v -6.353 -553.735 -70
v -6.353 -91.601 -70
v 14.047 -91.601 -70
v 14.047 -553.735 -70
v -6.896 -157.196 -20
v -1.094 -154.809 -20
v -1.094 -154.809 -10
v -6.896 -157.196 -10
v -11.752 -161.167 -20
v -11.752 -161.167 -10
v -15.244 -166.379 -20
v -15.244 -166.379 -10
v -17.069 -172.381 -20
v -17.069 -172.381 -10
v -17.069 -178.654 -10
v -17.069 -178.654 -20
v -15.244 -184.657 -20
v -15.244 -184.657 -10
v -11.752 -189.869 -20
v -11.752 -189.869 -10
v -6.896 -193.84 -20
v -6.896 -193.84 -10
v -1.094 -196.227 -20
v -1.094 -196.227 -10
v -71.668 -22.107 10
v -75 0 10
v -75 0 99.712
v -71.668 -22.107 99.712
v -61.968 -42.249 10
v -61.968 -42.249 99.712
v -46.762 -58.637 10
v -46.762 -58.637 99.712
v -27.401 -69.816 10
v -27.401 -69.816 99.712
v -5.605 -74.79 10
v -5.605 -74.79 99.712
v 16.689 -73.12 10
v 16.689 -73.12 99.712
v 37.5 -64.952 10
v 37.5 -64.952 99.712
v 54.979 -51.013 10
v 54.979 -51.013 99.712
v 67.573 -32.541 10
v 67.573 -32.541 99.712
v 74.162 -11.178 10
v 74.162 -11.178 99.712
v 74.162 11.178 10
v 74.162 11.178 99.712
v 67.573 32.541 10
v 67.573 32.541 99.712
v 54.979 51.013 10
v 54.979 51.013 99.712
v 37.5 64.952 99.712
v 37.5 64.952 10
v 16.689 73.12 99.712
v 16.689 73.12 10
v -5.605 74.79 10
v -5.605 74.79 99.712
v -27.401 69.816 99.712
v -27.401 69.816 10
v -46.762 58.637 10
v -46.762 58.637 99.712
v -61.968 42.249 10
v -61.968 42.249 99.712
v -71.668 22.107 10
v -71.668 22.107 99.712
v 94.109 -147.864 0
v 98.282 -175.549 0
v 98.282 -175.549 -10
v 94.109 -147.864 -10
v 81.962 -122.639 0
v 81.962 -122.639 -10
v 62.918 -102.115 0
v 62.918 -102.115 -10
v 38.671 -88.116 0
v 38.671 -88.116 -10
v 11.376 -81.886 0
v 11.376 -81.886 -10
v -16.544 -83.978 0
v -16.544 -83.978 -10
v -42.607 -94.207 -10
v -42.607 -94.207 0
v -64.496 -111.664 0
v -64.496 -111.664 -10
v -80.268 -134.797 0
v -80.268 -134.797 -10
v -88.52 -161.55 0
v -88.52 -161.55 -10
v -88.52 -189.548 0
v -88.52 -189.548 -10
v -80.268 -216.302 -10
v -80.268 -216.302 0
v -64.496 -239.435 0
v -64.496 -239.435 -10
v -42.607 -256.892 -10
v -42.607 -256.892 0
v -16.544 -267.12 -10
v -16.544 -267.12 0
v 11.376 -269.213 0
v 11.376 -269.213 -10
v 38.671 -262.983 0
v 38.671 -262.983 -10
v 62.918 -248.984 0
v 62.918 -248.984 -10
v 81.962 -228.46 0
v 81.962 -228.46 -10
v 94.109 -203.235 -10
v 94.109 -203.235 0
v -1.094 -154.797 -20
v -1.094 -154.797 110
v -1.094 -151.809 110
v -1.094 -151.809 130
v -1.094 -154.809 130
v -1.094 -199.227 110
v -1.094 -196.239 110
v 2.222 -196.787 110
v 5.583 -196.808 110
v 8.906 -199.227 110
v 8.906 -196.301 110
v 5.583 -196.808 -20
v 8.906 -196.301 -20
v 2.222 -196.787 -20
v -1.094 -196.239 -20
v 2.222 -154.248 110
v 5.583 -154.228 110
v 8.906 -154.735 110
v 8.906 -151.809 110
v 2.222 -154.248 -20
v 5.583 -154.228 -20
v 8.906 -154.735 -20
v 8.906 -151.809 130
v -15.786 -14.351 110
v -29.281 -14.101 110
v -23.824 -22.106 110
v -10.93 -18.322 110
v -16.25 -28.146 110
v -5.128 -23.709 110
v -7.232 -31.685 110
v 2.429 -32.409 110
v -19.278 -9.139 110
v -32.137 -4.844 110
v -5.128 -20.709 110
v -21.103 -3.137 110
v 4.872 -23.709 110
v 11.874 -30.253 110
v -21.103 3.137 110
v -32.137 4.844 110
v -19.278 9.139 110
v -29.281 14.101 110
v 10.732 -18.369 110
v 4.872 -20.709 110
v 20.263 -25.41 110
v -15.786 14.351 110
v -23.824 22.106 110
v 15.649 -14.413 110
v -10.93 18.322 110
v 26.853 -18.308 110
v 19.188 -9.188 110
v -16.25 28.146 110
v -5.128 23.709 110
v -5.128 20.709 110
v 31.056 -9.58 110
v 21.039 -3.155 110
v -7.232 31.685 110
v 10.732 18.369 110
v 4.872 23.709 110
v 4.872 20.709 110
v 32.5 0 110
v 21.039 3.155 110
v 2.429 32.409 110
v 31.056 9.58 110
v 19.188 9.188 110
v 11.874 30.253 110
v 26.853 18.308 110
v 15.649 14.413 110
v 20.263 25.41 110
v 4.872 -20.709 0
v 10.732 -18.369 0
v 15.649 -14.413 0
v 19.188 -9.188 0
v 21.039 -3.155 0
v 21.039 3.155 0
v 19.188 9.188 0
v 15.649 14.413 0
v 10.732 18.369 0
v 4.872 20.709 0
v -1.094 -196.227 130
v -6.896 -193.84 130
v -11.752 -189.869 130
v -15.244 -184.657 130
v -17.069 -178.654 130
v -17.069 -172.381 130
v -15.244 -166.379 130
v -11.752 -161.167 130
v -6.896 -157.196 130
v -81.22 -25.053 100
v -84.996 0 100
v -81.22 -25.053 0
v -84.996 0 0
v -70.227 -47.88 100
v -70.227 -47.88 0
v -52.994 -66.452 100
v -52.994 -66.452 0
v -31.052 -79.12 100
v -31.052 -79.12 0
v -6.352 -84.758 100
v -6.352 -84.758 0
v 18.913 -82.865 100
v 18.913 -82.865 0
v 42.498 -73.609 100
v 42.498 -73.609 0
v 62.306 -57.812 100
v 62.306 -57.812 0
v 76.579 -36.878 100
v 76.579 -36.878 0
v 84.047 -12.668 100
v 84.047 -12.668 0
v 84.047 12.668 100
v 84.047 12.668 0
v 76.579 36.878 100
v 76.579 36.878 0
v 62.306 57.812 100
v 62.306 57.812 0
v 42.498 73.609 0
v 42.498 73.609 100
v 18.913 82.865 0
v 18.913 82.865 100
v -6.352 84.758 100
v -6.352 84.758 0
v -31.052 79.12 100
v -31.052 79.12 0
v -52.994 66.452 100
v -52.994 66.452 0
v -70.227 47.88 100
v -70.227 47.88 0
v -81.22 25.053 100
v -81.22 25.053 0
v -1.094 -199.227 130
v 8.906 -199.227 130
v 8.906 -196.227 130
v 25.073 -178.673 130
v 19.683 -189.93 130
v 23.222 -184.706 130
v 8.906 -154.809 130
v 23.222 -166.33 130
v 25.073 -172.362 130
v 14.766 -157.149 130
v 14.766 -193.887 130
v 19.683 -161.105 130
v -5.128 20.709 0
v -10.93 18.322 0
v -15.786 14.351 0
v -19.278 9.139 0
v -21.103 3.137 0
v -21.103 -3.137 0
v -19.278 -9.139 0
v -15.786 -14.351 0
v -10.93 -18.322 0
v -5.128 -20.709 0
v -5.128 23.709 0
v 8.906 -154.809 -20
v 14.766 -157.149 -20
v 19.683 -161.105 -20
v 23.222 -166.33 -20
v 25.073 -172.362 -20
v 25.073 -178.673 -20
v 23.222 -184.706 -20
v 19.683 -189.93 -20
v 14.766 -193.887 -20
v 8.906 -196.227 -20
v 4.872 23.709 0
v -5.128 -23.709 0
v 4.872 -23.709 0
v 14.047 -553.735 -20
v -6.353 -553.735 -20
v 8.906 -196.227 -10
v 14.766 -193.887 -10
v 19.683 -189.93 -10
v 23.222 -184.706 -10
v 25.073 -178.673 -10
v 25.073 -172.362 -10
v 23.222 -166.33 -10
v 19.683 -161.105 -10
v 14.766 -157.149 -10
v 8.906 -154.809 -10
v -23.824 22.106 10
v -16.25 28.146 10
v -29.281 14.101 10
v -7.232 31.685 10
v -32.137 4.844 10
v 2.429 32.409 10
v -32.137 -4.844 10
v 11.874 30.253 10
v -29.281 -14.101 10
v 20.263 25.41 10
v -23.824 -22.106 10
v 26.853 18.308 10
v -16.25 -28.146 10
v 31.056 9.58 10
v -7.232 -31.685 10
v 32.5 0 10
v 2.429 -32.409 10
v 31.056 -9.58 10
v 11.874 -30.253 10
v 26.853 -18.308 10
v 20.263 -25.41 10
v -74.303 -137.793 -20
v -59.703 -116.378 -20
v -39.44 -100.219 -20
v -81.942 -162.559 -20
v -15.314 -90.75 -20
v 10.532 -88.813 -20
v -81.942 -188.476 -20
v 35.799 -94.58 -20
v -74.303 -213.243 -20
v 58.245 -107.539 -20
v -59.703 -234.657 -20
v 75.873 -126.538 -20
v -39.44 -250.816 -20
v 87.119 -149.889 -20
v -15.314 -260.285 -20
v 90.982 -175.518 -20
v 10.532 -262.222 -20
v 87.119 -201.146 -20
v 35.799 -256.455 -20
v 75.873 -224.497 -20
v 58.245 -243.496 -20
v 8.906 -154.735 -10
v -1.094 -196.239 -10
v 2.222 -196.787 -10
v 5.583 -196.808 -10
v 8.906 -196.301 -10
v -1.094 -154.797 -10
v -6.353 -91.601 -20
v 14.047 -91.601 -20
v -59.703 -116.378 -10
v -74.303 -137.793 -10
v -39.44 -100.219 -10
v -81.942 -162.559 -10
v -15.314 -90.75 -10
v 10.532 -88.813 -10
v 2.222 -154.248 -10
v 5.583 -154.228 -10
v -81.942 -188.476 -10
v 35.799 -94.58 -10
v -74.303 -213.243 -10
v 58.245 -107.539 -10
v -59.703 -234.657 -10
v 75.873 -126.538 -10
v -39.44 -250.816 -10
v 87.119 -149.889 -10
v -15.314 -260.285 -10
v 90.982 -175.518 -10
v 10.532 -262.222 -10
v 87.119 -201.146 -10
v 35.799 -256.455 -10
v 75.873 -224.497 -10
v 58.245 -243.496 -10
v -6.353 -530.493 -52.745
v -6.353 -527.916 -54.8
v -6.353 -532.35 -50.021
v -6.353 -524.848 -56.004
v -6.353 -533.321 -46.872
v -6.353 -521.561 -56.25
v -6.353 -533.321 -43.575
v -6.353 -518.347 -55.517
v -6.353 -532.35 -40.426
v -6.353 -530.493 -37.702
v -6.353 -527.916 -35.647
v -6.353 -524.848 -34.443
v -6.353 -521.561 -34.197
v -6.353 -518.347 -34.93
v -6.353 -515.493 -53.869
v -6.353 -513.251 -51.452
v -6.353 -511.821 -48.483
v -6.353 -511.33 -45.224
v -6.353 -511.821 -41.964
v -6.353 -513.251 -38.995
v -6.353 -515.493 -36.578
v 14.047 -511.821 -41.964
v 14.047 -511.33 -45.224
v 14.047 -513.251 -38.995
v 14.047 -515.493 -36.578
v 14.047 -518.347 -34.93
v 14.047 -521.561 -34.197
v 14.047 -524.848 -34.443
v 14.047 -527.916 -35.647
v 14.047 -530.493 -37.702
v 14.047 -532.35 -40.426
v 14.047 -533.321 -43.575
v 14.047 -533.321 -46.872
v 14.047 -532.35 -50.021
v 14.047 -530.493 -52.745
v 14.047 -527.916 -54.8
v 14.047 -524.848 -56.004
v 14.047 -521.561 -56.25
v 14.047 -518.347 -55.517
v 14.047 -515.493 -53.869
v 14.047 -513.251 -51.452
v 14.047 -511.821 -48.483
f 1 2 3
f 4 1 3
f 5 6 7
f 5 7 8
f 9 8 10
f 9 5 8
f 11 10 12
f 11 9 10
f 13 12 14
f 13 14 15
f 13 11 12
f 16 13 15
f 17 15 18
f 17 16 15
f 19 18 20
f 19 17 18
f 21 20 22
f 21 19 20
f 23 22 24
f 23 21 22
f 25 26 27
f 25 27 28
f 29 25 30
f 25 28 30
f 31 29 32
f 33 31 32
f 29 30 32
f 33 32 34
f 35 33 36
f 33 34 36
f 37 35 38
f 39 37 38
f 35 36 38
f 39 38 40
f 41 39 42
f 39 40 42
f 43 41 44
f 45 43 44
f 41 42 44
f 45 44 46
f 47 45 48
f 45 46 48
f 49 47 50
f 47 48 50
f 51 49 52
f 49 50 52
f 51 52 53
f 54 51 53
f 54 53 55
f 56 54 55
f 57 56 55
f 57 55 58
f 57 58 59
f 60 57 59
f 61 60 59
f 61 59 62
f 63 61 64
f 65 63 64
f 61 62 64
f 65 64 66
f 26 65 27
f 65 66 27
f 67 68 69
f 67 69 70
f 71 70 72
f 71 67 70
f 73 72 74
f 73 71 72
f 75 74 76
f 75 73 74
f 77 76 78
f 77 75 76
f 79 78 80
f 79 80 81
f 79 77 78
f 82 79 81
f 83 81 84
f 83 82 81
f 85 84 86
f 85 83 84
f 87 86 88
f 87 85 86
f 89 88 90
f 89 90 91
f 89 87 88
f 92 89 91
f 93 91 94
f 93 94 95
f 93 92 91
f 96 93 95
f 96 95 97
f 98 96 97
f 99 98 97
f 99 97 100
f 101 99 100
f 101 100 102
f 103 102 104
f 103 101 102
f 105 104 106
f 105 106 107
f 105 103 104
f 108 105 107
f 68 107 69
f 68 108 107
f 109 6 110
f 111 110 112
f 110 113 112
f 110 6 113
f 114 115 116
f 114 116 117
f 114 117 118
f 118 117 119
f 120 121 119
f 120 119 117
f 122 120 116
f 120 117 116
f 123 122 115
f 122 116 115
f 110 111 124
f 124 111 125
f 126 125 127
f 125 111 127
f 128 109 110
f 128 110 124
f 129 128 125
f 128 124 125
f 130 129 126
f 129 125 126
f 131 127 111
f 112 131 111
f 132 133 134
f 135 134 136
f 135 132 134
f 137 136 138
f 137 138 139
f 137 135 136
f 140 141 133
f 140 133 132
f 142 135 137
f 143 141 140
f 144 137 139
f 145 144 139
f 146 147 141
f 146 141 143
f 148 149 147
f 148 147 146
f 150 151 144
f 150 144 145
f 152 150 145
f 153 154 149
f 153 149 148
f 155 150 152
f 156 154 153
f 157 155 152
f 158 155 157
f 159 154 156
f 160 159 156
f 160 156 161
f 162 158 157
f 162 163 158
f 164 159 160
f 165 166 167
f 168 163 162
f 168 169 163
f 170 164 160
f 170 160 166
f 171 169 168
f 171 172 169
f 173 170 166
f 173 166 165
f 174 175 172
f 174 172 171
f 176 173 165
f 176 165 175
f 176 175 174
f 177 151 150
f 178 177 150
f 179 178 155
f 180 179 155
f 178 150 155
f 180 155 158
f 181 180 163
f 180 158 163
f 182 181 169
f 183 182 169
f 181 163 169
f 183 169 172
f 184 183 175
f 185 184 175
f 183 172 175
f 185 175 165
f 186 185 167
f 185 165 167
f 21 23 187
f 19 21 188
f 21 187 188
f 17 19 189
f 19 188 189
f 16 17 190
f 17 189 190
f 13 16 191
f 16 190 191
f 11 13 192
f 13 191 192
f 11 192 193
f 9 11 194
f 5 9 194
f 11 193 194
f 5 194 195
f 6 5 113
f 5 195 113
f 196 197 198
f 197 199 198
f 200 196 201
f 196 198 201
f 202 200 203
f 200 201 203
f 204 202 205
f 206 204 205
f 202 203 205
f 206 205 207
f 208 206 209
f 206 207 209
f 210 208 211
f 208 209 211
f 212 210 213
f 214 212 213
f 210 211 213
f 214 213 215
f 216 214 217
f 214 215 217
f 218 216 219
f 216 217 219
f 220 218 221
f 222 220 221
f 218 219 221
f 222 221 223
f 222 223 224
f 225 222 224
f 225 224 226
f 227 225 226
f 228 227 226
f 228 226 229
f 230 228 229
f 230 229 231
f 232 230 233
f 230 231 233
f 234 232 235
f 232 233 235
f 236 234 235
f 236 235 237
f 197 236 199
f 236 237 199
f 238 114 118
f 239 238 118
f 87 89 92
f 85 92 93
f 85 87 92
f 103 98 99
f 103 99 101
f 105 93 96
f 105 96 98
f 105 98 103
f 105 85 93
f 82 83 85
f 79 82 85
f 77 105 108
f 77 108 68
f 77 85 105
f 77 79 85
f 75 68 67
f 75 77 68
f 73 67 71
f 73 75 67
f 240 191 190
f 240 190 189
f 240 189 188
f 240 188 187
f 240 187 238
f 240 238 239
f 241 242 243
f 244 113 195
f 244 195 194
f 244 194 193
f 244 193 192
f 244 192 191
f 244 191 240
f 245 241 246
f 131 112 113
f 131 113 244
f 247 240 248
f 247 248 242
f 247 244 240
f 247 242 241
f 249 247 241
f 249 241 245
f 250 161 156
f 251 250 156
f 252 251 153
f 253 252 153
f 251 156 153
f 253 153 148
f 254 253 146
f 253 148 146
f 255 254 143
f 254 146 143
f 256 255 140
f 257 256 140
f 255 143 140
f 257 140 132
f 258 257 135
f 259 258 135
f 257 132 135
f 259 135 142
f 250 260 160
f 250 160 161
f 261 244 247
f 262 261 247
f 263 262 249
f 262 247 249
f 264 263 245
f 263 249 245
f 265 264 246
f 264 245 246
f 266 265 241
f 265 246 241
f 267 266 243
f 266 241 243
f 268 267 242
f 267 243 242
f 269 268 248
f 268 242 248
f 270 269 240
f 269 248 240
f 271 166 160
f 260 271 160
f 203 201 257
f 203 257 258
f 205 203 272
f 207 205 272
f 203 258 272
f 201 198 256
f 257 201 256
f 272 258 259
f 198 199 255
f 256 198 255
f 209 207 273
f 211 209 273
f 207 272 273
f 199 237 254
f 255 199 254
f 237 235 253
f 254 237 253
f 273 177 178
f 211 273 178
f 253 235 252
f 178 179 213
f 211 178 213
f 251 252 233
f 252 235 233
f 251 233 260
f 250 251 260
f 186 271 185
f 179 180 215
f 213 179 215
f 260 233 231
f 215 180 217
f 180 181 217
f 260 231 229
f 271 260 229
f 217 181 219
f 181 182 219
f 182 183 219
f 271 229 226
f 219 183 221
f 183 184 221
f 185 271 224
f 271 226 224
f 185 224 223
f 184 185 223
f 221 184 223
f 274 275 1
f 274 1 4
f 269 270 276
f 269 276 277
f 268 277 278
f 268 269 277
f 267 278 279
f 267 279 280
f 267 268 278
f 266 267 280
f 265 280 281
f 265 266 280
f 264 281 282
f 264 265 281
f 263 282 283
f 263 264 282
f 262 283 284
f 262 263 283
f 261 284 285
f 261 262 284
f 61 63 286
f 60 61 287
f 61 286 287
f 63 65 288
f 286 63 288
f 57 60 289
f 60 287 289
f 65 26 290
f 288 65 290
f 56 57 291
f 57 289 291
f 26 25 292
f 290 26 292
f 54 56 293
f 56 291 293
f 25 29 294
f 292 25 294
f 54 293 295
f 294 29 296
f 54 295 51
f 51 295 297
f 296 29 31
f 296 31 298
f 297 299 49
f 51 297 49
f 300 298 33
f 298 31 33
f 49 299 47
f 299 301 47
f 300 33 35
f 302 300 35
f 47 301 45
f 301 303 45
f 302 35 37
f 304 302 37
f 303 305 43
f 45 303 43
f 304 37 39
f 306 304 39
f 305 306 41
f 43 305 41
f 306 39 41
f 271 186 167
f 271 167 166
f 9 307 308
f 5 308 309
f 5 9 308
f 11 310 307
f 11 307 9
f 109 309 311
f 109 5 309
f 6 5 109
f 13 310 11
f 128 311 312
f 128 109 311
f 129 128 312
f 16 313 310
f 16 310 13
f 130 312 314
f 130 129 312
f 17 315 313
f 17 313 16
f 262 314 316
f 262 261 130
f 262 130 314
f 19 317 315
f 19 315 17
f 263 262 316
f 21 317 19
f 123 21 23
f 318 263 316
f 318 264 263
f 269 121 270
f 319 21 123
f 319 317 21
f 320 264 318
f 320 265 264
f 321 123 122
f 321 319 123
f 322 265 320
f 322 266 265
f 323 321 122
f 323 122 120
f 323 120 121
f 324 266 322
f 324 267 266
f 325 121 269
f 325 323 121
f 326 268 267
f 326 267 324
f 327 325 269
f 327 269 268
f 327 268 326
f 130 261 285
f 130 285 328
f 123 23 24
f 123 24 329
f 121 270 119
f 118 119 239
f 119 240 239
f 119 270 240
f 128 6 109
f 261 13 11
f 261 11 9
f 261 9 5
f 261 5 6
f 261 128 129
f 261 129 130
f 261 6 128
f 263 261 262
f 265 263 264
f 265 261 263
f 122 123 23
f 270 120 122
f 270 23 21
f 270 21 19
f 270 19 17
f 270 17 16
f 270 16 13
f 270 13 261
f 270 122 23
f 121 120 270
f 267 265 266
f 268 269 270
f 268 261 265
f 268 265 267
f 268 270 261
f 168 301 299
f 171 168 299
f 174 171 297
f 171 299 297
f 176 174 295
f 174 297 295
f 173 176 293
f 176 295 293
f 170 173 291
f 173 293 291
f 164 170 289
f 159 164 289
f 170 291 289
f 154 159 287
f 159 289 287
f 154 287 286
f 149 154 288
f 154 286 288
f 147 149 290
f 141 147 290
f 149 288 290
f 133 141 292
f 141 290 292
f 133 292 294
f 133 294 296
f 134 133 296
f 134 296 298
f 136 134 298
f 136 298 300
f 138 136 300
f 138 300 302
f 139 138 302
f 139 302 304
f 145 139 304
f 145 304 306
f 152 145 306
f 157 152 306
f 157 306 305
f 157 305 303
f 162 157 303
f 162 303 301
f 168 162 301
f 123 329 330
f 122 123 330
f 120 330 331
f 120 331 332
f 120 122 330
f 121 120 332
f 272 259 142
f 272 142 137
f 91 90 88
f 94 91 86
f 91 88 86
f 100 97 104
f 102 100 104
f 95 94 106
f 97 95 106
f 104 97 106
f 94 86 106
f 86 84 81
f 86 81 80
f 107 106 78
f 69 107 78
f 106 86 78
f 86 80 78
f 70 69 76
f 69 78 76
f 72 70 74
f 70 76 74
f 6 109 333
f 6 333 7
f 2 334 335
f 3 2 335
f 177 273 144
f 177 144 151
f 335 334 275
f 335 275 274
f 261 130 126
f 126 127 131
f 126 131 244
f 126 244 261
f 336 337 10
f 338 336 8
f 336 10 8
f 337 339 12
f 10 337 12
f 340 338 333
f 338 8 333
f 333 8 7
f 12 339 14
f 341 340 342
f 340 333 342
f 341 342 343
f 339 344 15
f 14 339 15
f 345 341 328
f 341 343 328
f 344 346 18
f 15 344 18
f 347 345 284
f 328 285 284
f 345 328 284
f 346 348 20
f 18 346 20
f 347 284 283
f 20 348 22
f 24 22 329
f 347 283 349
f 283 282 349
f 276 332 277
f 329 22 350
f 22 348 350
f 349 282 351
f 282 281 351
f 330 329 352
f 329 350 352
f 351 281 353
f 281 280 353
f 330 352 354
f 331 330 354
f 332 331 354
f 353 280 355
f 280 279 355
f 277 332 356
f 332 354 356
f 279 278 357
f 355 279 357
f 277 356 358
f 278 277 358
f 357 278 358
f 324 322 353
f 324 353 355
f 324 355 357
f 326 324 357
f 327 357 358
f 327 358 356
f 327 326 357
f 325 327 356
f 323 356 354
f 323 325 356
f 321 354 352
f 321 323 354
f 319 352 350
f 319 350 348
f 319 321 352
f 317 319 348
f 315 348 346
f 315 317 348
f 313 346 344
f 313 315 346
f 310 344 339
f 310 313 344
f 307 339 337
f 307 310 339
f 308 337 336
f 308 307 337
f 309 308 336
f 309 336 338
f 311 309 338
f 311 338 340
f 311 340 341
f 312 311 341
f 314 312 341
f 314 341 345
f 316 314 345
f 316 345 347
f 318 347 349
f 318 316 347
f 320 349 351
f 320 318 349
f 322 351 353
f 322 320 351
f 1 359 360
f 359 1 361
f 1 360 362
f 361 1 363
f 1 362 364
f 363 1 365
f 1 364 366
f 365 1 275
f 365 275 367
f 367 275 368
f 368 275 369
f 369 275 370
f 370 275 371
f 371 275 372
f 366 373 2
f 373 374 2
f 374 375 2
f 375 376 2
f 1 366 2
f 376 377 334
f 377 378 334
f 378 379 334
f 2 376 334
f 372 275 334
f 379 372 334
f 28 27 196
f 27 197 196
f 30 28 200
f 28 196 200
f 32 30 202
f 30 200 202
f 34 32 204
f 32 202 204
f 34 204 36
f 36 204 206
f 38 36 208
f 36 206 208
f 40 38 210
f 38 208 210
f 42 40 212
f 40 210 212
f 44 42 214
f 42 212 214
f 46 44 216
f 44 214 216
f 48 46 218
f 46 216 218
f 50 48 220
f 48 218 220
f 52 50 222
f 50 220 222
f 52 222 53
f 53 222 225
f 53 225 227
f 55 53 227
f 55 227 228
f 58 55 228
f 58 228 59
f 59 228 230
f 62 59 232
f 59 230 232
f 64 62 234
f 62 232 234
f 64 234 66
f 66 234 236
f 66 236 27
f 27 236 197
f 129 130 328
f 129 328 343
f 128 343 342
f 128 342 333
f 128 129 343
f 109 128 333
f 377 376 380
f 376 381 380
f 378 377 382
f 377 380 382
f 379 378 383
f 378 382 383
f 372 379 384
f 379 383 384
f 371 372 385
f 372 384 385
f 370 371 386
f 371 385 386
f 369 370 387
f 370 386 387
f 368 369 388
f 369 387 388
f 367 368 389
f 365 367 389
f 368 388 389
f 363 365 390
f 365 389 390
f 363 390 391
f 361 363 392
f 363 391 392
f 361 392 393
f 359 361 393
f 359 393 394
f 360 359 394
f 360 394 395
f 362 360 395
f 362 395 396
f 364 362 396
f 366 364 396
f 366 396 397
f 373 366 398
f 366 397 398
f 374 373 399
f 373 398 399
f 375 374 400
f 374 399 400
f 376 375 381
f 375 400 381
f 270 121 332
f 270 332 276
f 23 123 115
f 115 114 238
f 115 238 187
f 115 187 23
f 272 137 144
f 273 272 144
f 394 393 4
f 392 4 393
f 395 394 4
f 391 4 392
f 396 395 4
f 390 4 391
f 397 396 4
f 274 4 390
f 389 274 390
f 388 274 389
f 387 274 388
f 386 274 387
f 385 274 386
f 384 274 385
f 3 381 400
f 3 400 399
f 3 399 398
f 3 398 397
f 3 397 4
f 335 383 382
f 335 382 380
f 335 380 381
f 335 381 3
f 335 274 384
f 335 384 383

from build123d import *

# Parameters (mm, degrees)
F3_R      = 32.5
F4_DEPTH  = 110
F7_DEPTH  = 150
F9_DEPTH  = 20
F11_DEPTH = 130
F13_R     = 86.9475315801
F14_DEPTH = 10
F16_R     = 93.9258918308
F17_DEPTH = 10
F18_W     = 20.3998130746
F18_H     = 462.1341228485
F19_DEPTH = 50
F20_R     = 11.0575389885
F21_DEPTH = 50
F22_DEPTH = 25


with BuildPart() as f1:
    # F0 (on Front) → F1 (revolve)
    with BuildSketch(Plane.XZ):
        Polygon((-75, 99.7116579087), (-84.9958420775, 100), (-84.9958420775, 0), (0, 0), (0, 10), (-75, 10), align=None)
    revolve(axis=Axis((0, 0, 5), (0, 0, 1)))

    # F3 (on Top) → F4 (join)
    with BuildSketch(Plane.XY):
        Circle(F3_R)
    extrude(amount=F4_DEPTH)

    # F6 (on offset) → F7 (cut)
    with BuildSketch(Plane.XY.offset(140)):
        with BuildLine():
            Line((4.8717501444, 20.7090355216), (4.8717501444, 23.7090355216))
            Line((4.8717501444, 23.7090355216), (-5.1282498556, 23.7090355216))
            Line((-5.1282498556, 23.7090355216), (-5.1282498556, 20.7090355216))
            ThreePointArc((-5.1282498556, 20.7090355216), (-21.3345517604, 0), (-5.1282498556, -20.7090355216))
            Line((-5.1282498556, -20.7090355216), (-5.1282498556, -23.7090355216))
            Line((-5.1282498556, -23.7090355216), (4.8717501444, -23.7090355216))
            Line((4.8717501444, -23.7090355216), (4.8717501444, -20.7090355216))
            ThreePointArc((4.8717501444, -20.7090355216), (21.2743531442, 0), (4.8717501444, 20.7090355216))
        make_face()
    extrude(amount=-F7_DEPTH, mode=Mode.SUBTRACT)


with BuildPart() as f9:
    # F8 (on offset) → F9 (new body)
    with BuildSketch(Plane.XY.offset(110)):
        with BuildLine():
            Line((8.9057389681, -154.8086054863), (8.9057389681, -151.8086054863))
            Line((8.9057389681, -151.8086054863), (-1.0942610319, -151.8086054863))
            Line((-1.0942610319, -151.8086054863), (-1.0942610319, -154.8086054863))
            ThreePointArc((-1.0942610319, -154.8086054863), (-17.3005629368, -175.5176410079), (-1.0942610319, -196.2266765295))
            Line((-1.0942610319, -196.2266765295), (-1.0942610319, -199.2266765295))
            Line((-1.0942610319, -199.2266765295), (8.9057389681, -199.2266765295))
            Line((8.9057389681, -199.2266765295), (8.9057389681, -196.2266765295))
            ThreePointArc((8.9057389681, -196.2266765295), (25.3083419679, -175.5176410079), (8.9057389681, -154.8086054863))
        make_face()
    extrude(amount=F9_DEPTH)

    # F10 (on face) → F11 (join)
    with BuildSketch(Plane(origin=(0, 0, 110), x_dir=(1, 0, 0), z_dir=(0, 0, -1))):
        with BuildLine():
            Line((8.9057389681, 196.2266765295), (8.9057389681, 196.3005188475))
            ThreePointArc((8.9057389681, 196.3005188475), (3.9020688679, 196.8634733386), (-1.0942610319, 196.238717577))
            Line((-1.0942610319, 196.238717577), (-1.0942610319, 196.2266765295))
            ThreePointArc((-1.0942610319, 196.2266765295), (-17.3005629368, 175.5176410079), (-1.0942610319, 154.8086054863))
            Line((-1.0942610319, 154.8086054863), (-1.0942610319, 154.7965644388))
            ThreePointArc((-1.0942610319, 154.7965644388), (3.9020688679, 154.1718086772), (8.9057389681, 154.7347631683))
            Line((8.9057389681, 154.7347631683), (8.9057389681, 154.8086054863))
            ThreePointArc((8.9057389681, 154.8086054863), (25.3083419679, 175.5176410079), (8.9057389681, 196.2266765295))
        make_face()
    extrude(amount=F11_DEPTH)


with BuildPart() as f14:
    # F13 (on face) → F14 (new body)
    with BuildSketch(Plane(origin=(0, 0, -20), x_dir=(1, 0, 0), z_dir=(0, 0, -1))):
        with Locations((4.0339888236, 175.5176410079)):
            Circle(F13_R)
        with BuildLine():
            ThreePointArc((8.9057389681, 154.7347631683), (3.9020688679, 154.1718086772), (-1.0942610319, 154.7965644388))
            Line((-1.0942610319, 154.7965644388), (-1.0942610319, 154.8086054863))
            ThreePointArc((-1.0942610319, 154.8086054863), (-17.3005629368, 175.5176410079), (-1.0942610319, 196.2266765295))
            Line((-1.0942610319, 196.2266765295), (-1.0942610319, 196.238717577))
            ThreePointArc((-1.0942610319, 196.238717577), (3.9020688679, 196.8634733386), (8.9057389681, 196.3005188475))
            Line((8.9057389681, 196.3005188475), (8.9057389681, 196.2266765295))
            ThreePointArc((8.9057389681, 196.2266765295), (25.3083419679, 175.5176410079), (8.9057389681, 154.8086054863))
            Line((8.9057389681, 154.8086054863), (8.9057389681, 154.7347631683))
        make_face(mode=Mode.SUBTRACT)
    extrude(amount=-F14_DEPTH)


with BuildPart() as f17:
    # F16 (on offset) → F17 (new body)
    with BuildSketch(Plane.XY):
        with Locations((4.3564210646, -175.5494177341)):
            Circle(F16_R)
    extrude(amount=-F17_DEPTH)


with BuildPart() as f19:
    # F18 (on offset) → F19 (new body)
    with BuildSketch(Plane.XY.offset(-20)):
        with Locations((3.8470111322, -322.6678967476)):
            Rectangle(F18_W, F18_H)
    extrude(amount=-F19_DEPTH)

    # F20 (on Right) → F21 (cut)
    with BuildSketch(Plane.YZ):
        with Locations((-522.3870873451, -45.2235266566)):
            Circle(F20_R)
    extrude(amount=F21_DEPTH, mode=Mode.SUBTRACT)

    # F20 (on Right) → F22 (cut)
    with BuildSketch(Plane.YZ):
        with Locations((-522.3870873451, -45.2235266566)):
            Circle(F20_R)
    extrude(amount=-F22_DEPTH, mode=Mode.SUBTRACT)


solid = Compound([f1.part, f9.part, f14.part, f17.part, f19.part])
